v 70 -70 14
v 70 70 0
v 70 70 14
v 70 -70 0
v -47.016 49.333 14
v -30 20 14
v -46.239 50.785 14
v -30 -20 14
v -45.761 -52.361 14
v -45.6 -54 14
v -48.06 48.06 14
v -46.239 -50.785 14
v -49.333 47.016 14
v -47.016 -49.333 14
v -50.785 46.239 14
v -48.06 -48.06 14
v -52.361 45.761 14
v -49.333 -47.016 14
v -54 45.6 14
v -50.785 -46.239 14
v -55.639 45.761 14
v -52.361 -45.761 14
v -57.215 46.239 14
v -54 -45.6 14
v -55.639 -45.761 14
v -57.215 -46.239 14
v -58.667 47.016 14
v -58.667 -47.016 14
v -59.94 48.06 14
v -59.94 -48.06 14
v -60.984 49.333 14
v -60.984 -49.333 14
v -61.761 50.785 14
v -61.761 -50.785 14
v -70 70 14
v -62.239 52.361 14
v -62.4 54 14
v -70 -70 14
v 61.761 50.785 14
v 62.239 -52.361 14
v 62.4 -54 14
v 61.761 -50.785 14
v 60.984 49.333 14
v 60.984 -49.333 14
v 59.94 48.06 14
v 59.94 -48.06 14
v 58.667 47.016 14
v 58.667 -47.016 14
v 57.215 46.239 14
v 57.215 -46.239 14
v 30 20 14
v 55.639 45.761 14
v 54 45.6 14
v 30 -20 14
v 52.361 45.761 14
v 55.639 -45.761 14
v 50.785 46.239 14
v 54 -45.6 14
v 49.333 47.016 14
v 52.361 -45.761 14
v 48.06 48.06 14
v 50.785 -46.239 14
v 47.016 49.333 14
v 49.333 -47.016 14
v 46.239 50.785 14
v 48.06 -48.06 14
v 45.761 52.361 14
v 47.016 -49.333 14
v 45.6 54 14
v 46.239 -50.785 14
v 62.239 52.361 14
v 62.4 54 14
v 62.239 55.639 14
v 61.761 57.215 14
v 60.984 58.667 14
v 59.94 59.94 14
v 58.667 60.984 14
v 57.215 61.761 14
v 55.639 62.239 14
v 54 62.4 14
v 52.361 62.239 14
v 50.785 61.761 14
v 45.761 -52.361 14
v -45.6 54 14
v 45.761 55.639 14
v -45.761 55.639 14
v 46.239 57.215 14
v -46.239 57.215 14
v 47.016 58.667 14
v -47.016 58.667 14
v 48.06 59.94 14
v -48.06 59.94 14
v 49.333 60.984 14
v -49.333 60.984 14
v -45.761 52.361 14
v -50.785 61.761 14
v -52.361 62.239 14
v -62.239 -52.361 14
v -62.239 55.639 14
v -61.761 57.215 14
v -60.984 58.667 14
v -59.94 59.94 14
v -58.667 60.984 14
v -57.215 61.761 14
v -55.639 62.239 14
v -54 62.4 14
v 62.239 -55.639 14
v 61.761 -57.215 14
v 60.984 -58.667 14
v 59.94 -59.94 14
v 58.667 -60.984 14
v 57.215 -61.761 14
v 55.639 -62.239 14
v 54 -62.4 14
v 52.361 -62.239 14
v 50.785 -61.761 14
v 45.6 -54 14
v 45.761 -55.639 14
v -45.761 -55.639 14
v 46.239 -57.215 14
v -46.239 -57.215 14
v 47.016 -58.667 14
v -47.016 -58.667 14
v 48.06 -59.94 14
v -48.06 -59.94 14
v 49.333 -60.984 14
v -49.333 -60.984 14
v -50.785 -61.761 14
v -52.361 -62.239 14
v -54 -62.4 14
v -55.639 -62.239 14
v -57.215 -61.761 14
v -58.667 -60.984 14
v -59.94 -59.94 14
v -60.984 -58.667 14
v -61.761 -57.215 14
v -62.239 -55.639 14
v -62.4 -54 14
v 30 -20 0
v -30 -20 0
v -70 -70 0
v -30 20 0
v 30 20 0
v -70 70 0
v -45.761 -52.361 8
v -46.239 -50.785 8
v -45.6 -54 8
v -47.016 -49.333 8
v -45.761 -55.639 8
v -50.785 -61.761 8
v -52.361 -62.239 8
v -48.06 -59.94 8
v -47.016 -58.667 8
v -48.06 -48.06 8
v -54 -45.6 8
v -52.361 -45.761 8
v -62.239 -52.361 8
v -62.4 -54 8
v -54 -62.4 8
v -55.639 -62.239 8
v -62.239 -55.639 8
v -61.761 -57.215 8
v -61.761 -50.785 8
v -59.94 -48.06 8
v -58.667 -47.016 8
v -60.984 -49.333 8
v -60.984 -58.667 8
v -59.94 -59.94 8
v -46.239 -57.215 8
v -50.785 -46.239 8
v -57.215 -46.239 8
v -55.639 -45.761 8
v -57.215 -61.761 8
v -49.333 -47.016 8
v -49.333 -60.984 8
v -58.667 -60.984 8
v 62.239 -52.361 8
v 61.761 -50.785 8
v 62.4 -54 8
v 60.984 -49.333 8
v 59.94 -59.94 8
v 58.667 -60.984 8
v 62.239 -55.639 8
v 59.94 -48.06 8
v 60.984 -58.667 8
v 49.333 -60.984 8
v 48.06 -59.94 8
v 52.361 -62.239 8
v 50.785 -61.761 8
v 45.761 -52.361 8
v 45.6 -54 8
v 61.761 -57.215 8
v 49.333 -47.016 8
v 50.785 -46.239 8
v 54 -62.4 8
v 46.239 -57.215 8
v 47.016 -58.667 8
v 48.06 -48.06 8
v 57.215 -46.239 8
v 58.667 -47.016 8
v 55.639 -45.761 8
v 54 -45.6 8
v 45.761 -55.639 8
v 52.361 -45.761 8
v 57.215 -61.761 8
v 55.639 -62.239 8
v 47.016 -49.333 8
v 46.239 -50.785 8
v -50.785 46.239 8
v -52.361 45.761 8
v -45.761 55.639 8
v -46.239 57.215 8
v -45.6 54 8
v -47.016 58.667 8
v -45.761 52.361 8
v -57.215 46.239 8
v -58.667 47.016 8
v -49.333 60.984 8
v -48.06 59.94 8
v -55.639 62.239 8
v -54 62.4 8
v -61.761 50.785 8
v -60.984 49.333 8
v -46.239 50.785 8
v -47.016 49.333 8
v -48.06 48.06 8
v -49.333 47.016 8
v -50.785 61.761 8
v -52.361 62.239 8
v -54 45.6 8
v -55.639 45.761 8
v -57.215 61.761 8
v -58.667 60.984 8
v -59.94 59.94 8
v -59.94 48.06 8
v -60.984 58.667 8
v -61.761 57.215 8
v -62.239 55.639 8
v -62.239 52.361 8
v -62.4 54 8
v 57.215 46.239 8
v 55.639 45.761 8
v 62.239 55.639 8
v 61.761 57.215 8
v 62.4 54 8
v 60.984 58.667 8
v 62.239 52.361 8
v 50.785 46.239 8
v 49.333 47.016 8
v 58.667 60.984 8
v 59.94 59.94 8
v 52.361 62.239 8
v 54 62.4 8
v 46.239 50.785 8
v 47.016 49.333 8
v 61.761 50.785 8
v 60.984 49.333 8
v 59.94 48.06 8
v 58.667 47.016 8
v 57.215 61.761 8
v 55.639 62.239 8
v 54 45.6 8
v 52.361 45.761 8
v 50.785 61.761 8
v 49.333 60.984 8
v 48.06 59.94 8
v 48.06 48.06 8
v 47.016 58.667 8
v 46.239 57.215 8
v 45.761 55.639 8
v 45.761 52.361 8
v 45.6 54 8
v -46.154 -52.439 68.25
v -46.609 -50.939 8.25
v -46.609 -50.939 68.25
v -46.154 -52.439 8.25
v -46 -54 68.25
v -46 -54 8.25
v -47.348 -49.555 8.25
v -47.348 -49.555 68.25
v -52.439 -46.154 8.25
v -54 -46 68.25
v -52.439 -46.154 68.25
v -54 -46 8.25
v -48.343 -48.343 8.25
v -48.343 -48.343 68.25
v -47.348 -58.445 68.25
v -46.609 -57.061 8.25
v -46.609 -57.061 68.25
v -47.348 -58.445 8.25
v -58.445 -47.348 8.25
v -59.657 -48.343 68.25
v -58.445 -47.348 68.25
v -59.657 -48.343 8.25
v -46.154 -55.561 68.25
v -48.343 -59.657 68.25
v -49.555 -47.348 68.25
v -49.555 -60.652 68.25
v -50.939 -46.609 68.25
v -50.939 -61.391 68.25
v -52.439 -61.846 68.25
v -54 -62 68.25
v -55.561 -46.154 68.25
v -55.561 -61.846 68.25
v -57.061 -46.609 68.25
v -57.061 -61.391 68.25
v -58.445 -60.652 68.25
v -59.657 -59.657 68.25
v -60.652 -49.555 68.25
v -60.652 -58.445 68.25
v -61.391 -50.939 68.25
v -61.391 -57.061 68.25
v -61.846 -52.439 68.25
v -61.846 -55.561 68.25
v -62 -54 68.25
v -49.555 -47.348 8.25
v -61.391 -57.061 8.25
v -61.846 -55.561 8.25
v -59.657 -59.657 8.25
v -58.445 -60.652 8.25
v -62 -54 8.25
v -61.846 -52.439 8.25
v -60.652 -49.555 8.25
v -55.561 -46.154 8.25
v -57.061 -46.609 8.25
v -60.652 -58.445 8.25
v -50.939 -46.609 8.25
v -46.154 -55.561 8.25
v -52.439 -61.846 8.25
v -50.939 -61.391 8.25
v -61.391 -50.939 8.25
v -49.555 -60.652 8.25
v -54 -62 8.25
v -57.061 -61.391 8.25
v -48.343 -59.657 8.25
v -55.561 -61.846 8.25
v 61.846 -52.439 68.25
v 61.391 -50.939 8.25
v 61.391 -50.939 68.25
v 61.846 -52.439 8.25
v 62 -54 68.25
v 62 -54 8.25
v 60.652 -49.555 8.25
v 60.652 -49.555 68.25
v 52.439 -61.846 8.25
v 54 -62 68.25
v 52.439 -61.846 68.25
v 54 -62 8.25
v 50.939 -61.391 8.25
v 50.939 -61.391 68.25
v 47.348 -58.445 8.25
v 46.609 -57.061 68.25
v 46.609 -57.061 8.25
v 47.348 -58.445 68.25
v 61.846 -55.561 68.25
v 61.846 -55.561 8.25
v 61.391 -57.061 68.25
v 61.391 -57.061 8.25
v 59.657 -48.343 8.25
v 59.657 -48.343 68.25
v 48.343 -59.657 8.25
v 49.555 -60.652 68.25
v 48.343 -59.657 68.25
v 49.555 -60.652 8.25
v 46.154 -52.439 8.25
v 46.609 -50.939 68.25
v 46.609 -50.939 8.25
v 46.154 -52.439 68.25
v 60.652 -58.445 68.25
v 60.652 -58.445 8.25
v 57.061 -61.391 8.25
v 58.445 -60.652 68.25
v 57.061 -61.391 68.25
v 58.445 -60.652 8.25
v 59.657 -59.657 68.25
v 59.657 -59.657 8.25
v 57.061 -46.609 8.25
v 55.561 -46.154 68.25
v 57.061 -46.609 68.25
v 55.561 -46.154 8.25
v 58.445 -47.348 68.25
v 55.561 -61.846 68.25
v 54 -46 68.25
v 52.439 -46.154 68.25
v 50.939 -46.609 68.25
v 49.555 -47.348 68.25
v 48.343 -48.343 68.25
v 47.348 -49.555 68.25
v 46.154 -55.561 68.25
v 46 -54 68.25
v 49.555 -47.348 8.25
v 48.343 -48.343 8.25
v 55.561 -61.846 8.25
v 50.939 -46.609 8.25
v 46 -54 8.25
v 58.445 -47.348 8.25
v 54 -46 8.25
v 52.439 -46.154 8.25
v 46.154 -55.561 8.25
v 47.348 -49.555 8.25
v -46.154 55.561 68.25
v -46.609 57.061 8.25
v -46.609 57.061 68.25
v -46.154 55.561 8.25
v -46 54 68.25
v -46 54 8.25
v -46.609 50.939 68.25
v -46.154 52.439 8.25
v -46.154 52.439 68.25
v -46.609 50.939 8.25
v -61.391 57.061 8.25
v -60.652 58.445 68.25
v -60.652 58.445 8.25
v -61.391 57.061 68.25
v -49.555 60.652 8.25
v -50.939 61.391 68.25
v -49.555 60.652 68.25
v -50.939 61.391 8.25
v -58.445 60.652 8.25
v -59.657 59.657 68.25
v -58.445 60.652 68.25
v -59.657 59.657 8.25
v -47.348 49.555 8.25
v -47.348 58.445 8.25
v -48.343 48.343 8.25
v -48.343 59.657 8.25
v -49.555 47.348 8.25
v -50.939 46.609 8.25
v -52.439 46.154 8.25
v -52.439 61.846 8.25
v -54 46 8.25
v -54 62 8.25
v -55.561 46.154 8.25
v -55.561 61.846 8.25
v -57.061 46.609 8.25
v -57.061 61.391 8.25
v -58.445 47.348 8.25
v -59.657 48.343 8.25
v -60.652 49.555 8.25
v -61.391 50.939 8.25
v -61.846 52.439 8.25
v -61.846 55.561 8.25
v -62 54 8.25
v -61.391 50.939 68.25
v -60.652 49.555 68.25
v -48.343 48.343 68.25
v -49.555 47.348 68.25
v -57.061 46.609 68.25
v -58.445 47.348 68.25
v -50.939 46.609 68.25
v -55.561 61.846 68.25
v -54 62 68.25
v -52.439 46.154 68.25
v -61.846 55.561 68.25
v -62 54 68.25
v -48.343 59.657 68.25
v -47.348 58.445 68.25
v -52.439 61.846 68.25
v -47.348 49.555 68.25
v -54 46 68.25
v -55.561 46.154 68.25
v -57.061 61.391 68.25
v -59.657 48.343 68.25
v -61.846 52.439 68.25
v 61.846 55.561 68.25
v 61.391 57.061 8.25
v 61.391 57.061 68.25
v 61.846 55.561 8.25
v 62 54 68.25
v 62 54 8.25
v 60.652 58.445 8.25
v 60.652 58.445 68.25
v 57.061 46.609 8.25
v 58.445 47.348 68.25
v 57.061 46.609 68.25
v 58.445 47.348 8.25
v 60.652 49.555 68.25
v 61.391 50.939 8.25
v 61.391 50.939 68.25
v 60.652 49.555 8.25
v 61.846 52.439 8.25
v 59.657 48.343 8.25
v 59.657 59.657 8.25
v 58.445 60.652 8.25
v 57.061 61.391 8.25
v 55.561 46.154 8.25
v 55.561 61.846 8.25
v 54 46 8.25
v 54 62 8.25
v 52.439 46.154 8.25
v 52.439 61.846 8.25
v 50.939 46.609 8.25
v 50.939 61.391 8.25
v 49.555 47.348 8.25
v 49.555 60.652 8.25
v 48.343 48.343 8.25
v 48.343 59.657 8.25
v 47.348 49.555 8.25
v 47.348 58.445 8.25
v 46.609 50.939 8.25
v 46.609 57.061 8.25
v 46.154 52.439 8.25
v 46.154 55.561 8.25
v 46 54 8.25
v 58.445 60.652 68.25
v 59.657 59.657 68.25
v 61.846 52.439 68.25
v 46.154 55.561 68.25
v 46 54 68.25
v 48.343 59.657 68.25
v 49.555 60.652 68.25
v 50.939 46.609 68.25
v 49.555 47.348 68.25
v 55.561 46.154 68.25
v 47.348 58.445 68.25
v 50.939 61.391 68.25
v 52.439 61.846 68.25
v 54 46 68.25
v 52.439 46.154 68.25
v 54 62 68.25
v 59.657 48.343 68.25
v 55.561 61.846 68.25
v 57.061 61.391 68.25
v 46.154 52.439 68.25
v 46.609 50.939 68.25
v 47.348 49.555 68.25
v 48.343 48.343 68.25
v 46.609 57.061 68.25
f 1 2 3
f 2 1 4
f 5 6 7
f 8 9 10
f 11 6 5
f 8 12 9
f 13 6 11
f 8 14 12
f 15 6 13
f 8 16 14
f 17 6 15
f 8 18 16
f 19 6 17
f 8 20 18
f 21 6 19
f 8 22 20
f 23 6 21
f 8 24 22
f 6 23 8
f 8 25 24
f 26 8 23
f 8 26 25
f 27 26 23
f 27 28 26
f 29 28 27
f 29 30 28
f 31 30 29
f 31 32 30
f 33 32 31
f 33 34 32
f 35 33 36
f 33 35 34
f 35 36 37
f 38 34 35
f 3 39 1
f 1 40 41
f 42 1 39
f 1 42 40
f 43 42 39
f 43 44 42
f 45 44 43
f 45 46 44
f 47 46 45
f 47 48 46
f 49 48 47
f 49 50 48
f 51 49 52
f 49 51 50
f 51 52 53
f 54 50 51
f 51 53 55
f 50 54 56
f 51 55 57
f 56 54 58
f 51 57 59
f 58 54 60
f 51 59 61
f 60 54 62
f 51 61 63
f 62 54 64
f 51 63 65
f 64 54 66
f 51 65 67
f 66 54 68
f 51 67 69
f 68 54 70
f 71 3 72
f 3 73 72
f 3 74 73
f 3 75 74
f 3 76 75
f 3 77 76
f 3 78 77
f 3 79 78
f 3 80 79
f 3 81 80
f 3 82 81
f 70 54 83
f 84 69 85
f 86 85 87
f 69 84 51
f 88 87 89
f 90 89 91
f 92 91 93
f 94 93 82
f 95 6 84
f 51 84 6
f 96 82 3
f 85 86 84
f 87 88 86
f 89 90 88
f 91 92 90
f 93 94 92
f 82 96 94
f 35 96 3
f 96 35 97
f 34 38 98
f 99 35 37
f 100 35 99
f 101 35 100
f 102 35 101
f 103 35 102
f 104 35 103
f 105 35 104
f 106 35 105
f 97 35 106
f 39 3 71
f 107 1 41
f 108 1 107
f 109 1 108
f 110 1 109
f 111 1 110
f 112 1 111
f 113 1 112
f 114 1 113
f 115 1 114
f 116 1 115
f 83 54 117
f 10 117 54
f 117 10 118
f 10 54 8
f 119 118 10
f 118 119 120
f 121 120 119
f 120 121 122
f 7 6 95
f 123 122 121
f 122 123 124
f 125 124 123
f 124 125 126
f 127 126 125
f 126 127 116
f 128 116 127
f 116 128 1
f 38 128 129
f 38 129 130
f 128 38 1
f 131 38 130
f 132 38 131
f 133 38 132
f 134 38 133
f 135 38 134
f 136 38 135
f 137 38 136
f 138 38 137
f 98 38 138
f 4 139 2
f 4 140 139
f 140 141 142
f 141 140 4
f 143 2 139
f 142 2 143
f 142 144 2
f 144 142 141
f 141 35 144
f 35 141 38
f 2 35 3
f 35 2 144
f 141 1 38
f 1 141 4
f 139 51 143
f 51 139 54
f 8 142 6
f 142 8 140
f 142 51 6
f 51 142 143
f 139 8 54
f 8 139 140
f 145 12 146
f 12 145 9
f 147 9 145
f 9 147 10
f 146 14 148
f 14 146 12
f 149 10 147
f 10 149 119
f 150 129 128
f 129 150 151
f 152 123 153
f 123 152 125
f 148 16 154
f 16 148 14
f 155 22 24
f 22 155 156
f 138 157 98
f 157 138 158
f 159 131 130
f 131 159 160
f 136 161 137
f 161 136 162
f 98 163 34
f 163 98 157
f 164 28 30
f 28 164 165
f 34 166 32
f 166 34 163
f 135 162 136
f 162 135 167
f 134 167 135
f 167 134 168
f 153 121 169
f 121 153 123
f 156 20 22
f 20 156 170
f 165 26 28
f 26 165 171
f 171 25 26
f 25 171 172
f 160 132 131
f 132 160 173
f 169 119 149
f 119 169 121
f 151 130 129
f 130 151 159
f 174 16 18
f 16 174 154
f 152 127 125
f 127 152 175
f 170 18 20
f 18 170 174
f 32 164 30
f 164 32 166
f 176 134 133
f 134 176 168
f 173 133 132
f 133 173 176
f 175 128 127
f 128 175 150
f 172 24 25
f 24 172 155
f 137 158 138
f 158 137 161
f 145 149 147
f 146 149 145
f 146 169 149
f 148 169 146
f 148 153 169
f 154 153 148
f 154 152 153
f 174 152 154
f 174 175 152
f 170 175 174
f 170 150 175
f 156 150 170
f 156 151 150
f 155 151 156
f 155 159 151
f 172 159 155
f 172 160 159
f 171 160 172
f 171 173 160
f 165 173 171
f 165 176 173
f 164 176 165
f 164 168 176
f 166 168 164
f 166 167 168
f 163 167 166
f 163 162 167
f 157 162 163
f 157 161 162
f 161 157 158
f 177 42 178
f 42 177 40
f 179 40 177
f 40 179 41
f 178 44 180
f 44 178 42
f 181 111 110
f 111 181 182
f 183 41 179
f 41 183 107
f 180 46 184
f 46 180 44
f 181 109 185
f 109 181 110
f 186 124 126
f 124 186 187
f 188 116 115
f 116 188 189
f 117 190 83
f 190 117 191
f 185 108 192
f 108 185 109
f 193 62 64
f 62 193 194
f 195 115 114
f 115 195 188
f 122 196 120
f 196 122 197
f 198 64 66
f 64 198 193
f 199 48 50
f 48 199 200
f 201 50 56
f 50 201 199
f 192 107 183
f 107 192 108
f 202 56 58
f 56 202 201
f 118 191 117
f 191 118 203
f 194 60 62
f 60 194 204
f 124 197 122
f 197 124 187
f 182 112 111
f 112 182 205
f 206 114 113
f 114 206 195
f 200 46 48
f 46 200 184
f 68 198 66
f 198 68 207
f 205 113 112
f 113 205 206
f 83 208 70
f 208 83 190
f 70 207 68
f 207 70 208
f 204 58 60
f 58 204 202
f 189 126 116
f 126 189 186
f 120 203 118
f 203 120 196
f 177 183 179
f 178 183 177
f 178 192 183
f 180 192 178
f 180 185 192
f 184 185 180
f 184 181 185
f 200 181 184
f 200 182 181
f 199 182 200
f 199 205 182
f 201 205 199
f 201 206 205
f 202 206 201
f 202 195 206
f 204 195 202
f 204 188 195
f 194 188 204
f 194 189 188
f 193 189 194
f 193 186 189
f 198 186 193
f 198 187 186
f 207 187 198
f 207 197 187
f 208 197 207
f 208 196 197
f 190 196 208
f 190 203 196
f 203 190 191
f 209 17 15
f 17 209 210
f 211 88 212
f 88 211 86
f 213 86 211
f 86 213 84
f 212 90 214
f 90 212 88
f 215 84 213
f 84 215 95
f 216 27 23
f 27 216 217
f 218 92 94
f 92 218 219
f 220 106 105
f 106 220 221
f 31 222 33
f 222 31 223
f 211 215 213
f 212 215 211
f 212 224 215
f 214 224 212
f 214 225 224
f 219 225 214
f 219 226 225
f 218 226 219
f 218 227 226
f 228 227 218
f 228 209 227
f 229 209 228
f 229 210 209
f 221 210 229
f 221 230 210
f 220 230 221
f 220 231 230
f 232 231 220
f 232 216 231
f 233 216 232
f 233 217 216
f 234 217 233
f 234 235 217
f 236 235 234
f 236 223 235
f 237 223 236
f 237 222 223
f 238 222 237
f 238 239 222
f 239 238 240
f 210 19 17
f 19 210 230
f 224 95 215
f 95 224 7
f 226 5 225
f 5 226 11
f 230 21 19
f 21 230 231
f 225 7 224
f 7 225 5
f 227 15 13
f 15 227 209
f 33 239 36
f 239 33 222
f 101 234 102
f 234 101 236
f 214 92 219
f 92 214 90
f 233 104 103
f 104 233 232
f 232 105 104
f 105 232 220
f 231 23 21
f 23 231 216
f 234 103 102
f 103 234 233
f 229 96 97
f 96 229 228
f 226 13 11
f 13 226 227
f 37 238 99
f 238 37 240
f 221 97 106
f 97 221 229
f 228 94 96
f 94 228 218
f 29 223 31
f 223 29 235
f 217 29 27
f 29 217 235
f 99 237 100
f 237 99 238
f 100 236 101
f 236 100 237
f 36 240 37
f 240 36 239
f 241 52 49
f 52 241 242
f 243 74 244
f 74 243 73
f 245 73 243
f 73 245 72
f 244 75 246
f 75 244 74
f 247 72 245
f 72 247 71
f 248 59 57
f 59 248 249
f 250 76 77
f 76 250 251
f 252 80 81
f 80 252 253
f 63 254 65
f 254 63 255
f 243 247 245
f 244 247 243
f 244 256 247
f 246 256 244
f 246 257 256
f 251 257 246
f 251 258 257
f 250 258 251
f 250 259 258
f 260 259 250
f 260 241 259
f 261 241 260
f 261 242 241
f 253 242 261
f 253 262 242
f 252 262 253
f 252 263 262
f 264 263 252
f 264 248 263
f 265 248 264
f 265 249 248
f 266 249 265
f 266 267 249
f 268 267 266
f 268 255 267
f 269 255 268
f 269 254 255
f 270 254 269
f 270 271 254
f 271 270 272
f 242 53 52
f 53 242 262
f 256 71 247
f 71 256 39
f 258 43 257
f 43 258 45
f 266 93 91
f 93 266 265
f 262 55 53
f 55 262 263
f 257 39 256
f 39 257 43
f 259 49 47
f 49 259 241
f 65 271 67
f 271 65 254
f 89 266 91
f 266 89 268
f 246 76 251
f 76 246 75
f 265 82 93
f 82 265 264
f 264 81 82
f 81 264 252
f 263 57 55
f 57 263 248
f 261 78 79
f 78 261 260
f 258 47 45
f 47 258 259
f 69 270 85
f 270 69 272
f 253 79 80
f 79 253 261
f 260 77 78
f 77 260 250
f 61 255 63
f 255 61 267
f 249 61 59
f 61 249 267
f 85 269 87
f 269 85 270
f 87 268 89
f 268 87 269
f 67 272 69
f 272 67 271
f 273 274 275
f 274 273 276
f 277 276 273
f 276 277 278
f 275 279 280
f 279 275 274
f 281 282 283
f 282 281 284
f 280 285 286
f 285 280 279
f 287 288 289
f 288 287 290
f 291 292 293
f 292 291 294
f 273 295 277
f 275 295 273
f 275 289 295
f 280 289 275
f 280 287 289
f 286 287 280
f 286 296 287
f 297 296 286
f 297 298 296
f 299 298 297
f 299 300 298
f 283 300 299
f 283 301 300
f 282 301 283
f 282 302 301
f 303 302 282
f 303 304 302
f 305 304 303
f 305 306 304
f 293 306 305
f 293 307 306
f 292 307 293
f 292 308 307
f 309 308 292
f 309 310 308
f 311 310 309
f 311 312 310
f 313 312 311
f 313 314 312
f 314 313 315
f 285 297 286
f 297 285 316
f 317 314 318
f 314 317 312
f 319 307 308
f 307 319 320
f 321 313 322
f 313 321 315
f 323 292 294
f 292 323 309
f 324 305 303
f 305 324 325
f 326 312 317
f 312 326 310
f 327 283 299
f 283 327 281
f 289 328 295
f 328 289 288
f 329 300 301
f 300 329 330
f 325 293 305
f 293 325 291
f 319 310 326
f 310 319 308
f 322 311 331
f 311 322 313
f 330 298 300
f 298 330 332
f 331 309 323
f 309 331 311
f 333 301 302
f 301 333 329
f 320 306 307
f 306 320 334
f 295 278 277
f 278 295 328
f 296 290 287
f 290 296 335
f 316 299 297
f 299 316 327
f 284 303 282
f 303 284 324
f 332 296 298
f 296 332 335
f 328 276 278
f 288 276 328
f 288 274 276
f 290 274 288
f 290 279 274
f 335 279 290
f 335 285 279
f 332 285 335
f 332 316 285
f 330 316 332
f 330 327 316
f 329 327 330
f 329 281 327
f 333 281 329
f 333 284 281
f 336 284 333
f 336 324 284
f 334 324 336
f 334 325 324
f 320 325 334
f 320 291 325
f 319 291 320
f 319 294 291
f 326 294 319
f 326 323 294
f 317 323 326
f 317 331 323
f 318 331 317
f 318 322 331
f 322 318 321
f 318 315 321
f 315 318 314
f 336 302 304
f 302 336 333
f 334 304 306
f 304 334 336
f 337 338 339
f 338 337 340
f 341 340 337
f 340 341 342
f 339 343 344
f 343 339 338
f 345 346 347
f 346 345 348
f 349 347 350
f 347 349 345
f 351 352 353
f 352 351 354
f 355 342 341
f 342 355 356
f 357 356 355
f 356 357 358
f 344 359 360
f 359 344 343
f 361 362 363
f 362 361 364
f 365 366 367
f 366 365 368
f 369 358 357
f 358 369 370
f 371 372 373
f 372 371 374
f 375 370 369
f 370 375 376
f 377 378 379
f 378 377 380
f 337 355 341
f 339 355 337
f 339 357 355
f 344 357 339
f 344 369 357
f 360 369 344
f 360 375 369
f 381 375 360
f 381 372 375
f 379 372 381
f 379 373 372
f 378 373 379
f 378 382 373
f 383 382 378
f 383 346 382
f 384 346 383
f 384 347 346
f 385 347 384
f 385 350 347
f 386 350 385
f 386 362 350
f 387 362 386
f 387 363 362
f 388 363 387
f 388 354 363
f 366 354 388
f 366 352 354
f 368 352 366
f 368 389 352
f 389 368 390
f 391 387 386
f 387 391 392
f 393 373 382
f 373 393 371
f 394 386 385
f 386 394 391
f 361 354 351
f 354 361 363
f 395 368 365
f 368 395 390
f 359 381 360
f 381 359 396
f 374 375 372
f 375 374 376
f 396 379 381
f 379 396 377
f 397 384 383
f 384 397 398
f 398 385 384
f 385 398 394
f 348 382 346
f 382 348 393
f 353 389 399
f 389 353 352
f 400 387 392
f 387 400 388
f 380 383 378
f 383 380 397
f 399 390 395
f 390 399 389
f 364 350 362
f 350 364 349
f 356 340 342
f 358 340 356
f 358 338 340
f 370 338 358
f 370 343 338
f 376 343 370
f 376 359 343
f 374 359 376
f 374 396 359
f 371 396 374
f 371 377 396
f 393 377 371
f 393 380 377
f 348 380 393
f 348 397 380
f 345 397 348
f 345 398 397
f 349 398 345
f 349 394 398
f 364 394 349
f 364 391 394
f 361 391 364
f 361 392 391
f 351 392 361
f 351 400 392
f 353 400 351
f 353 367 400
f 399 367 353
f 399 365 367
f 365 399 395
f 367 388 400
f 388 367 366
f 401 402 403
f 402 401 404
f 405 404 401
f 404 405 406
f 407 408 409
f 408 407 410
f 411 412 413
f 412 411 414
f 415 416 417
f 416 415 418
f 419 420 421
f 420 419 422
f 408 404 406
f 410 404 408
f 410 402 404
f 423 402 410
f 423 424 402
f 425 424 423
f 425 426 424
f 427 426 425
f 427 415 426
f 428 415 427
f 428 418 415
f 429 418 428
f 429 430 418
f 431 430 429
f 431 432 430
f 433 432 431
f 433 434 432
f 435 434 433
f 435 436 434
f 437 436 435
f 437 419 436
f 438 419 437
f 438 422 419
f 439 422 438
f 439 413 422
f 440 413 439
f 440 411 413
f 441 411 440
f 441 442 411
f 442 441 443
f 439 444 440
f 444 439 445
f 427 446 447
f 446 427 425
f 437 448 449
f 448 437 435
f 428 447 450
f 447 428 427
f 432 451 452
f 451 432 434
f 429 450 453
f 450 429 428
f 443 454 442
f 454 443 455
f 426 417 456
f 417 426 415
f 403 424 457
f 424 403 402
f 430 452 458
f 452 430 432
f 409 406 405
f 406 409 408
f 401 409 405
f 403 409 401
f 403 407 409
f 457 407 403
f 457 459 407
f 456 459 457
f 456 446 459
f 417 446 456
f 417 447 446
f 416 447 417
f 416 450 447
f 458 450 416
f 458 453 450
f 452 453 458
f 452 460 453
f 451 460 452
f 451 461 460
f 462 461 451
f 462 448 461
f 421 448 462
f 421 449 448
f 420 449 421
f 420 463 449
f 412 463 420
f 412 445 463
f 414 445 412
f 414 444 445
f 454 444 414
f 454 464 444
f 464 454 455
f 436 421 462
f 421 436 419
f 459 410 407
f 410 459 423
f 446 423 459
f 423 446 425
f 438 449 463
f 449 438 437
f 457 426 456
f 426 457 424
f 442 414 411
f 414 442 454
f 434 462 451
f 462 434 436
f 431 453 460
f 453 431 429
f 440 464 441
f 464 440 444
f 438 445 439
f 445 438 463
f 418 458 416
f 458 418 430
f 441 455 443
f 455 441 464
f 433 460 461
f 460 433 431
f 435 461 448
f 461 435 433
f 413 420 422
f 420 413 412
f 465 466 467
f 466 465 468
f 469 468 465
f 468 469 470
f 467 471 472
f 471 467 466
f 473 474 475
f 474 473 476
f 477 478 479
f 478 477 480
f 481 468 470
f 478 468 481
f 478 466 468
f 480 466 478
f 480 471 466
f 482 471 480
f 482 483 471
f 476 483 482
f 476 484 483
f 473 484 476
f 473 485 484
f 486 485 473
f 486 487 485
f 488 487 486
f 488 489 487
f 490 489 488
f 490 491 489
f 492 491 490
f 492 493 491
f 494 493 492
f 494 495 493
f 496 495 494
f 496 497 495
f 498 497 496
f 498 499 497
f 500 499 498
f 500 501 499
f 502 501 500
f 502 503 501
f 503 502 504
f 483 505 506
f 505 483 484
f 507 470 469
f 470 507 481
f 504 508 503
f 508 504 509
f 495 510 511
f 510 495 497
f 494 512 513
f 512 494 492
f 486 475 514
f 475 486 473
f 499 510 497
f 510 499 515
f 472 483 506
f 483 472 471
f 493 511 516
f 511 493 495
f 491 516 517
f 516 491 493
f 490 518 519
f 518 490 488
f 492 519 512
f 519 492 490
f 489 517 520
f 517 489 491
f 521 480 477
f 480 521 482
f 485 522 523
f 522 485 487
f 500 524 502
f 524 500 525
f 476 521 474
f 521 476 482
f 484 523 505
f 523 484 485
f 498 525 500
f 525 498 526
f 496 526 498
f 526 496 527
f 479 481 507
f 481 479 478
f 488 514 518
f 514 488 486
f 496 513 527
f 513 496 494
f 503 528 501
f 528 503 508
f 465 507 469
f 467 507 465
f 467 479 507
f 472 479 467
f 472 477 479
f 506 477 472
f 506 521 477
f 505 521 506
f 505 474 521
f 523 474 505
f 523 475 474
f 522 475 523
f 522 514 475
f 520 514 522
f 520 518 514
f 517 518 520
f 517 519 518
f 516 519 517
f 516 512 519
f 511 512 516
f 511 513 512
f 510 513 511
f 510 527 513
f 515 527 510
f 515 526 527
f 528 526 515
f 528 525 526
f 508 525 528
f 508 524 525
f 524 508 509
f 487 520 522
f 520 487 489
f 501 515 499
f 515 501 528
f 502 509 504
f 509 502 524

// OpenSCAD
$fn = 32;

// ------------------------------------------------------------------------
// Frame with four posts: 140 x 140 mm frame, four d16 posts
// Every part is its own module, assembly() places them once.
// ------------------------------------------------------------------------

// --- part 1 ---
module base_frame() {
  difference() {
    translate([-70, -70, 0]) cube([140, 140, 14]);
    translate([-30, -20, -1]) cube([60, 40, 16]);
    translate([-54, -54, 8]) cylinder(h = 7, d = 16.8);
    translate([54, -54, 8]) cylinder(h = 7, d = 16.8);
    translate([-54, 54, 8]) cylinder(h = 7, d = 16.8);
    translate([54, 54, 8]) cylinder(h = 7, d = 16.8);
  }
}

// --- part 2 ---
module post1() {
  cylinder(h = 60, d = 16);
}

// --- part 3 ---
module post2() {
  cylinder(h = 60, d = 16);
}

// --- part 4 ---
module post3() {
  cylinder(h = 60, d = 16);
}

// --- part 5 ---
module post4() {
  cylinder(h = 60, d = 16);
}

// --- assembly ---
module assembly() {
  translate([0, 0, 0]) rotate([0, 0, 0]) base_frame();
  translate([-54, -54, 8.25]) rotate([0, 0, 0]) post1();
  translate([54, -54, 8.25]) rotate([0, 0, 0]) post2();
  translate([-54, 54, 8.25]) rotate([0, 0, 0]) post3();
  translate([54, 54, 8.25]) rotate([0, 0, 0]) post4();
}

assembly();
